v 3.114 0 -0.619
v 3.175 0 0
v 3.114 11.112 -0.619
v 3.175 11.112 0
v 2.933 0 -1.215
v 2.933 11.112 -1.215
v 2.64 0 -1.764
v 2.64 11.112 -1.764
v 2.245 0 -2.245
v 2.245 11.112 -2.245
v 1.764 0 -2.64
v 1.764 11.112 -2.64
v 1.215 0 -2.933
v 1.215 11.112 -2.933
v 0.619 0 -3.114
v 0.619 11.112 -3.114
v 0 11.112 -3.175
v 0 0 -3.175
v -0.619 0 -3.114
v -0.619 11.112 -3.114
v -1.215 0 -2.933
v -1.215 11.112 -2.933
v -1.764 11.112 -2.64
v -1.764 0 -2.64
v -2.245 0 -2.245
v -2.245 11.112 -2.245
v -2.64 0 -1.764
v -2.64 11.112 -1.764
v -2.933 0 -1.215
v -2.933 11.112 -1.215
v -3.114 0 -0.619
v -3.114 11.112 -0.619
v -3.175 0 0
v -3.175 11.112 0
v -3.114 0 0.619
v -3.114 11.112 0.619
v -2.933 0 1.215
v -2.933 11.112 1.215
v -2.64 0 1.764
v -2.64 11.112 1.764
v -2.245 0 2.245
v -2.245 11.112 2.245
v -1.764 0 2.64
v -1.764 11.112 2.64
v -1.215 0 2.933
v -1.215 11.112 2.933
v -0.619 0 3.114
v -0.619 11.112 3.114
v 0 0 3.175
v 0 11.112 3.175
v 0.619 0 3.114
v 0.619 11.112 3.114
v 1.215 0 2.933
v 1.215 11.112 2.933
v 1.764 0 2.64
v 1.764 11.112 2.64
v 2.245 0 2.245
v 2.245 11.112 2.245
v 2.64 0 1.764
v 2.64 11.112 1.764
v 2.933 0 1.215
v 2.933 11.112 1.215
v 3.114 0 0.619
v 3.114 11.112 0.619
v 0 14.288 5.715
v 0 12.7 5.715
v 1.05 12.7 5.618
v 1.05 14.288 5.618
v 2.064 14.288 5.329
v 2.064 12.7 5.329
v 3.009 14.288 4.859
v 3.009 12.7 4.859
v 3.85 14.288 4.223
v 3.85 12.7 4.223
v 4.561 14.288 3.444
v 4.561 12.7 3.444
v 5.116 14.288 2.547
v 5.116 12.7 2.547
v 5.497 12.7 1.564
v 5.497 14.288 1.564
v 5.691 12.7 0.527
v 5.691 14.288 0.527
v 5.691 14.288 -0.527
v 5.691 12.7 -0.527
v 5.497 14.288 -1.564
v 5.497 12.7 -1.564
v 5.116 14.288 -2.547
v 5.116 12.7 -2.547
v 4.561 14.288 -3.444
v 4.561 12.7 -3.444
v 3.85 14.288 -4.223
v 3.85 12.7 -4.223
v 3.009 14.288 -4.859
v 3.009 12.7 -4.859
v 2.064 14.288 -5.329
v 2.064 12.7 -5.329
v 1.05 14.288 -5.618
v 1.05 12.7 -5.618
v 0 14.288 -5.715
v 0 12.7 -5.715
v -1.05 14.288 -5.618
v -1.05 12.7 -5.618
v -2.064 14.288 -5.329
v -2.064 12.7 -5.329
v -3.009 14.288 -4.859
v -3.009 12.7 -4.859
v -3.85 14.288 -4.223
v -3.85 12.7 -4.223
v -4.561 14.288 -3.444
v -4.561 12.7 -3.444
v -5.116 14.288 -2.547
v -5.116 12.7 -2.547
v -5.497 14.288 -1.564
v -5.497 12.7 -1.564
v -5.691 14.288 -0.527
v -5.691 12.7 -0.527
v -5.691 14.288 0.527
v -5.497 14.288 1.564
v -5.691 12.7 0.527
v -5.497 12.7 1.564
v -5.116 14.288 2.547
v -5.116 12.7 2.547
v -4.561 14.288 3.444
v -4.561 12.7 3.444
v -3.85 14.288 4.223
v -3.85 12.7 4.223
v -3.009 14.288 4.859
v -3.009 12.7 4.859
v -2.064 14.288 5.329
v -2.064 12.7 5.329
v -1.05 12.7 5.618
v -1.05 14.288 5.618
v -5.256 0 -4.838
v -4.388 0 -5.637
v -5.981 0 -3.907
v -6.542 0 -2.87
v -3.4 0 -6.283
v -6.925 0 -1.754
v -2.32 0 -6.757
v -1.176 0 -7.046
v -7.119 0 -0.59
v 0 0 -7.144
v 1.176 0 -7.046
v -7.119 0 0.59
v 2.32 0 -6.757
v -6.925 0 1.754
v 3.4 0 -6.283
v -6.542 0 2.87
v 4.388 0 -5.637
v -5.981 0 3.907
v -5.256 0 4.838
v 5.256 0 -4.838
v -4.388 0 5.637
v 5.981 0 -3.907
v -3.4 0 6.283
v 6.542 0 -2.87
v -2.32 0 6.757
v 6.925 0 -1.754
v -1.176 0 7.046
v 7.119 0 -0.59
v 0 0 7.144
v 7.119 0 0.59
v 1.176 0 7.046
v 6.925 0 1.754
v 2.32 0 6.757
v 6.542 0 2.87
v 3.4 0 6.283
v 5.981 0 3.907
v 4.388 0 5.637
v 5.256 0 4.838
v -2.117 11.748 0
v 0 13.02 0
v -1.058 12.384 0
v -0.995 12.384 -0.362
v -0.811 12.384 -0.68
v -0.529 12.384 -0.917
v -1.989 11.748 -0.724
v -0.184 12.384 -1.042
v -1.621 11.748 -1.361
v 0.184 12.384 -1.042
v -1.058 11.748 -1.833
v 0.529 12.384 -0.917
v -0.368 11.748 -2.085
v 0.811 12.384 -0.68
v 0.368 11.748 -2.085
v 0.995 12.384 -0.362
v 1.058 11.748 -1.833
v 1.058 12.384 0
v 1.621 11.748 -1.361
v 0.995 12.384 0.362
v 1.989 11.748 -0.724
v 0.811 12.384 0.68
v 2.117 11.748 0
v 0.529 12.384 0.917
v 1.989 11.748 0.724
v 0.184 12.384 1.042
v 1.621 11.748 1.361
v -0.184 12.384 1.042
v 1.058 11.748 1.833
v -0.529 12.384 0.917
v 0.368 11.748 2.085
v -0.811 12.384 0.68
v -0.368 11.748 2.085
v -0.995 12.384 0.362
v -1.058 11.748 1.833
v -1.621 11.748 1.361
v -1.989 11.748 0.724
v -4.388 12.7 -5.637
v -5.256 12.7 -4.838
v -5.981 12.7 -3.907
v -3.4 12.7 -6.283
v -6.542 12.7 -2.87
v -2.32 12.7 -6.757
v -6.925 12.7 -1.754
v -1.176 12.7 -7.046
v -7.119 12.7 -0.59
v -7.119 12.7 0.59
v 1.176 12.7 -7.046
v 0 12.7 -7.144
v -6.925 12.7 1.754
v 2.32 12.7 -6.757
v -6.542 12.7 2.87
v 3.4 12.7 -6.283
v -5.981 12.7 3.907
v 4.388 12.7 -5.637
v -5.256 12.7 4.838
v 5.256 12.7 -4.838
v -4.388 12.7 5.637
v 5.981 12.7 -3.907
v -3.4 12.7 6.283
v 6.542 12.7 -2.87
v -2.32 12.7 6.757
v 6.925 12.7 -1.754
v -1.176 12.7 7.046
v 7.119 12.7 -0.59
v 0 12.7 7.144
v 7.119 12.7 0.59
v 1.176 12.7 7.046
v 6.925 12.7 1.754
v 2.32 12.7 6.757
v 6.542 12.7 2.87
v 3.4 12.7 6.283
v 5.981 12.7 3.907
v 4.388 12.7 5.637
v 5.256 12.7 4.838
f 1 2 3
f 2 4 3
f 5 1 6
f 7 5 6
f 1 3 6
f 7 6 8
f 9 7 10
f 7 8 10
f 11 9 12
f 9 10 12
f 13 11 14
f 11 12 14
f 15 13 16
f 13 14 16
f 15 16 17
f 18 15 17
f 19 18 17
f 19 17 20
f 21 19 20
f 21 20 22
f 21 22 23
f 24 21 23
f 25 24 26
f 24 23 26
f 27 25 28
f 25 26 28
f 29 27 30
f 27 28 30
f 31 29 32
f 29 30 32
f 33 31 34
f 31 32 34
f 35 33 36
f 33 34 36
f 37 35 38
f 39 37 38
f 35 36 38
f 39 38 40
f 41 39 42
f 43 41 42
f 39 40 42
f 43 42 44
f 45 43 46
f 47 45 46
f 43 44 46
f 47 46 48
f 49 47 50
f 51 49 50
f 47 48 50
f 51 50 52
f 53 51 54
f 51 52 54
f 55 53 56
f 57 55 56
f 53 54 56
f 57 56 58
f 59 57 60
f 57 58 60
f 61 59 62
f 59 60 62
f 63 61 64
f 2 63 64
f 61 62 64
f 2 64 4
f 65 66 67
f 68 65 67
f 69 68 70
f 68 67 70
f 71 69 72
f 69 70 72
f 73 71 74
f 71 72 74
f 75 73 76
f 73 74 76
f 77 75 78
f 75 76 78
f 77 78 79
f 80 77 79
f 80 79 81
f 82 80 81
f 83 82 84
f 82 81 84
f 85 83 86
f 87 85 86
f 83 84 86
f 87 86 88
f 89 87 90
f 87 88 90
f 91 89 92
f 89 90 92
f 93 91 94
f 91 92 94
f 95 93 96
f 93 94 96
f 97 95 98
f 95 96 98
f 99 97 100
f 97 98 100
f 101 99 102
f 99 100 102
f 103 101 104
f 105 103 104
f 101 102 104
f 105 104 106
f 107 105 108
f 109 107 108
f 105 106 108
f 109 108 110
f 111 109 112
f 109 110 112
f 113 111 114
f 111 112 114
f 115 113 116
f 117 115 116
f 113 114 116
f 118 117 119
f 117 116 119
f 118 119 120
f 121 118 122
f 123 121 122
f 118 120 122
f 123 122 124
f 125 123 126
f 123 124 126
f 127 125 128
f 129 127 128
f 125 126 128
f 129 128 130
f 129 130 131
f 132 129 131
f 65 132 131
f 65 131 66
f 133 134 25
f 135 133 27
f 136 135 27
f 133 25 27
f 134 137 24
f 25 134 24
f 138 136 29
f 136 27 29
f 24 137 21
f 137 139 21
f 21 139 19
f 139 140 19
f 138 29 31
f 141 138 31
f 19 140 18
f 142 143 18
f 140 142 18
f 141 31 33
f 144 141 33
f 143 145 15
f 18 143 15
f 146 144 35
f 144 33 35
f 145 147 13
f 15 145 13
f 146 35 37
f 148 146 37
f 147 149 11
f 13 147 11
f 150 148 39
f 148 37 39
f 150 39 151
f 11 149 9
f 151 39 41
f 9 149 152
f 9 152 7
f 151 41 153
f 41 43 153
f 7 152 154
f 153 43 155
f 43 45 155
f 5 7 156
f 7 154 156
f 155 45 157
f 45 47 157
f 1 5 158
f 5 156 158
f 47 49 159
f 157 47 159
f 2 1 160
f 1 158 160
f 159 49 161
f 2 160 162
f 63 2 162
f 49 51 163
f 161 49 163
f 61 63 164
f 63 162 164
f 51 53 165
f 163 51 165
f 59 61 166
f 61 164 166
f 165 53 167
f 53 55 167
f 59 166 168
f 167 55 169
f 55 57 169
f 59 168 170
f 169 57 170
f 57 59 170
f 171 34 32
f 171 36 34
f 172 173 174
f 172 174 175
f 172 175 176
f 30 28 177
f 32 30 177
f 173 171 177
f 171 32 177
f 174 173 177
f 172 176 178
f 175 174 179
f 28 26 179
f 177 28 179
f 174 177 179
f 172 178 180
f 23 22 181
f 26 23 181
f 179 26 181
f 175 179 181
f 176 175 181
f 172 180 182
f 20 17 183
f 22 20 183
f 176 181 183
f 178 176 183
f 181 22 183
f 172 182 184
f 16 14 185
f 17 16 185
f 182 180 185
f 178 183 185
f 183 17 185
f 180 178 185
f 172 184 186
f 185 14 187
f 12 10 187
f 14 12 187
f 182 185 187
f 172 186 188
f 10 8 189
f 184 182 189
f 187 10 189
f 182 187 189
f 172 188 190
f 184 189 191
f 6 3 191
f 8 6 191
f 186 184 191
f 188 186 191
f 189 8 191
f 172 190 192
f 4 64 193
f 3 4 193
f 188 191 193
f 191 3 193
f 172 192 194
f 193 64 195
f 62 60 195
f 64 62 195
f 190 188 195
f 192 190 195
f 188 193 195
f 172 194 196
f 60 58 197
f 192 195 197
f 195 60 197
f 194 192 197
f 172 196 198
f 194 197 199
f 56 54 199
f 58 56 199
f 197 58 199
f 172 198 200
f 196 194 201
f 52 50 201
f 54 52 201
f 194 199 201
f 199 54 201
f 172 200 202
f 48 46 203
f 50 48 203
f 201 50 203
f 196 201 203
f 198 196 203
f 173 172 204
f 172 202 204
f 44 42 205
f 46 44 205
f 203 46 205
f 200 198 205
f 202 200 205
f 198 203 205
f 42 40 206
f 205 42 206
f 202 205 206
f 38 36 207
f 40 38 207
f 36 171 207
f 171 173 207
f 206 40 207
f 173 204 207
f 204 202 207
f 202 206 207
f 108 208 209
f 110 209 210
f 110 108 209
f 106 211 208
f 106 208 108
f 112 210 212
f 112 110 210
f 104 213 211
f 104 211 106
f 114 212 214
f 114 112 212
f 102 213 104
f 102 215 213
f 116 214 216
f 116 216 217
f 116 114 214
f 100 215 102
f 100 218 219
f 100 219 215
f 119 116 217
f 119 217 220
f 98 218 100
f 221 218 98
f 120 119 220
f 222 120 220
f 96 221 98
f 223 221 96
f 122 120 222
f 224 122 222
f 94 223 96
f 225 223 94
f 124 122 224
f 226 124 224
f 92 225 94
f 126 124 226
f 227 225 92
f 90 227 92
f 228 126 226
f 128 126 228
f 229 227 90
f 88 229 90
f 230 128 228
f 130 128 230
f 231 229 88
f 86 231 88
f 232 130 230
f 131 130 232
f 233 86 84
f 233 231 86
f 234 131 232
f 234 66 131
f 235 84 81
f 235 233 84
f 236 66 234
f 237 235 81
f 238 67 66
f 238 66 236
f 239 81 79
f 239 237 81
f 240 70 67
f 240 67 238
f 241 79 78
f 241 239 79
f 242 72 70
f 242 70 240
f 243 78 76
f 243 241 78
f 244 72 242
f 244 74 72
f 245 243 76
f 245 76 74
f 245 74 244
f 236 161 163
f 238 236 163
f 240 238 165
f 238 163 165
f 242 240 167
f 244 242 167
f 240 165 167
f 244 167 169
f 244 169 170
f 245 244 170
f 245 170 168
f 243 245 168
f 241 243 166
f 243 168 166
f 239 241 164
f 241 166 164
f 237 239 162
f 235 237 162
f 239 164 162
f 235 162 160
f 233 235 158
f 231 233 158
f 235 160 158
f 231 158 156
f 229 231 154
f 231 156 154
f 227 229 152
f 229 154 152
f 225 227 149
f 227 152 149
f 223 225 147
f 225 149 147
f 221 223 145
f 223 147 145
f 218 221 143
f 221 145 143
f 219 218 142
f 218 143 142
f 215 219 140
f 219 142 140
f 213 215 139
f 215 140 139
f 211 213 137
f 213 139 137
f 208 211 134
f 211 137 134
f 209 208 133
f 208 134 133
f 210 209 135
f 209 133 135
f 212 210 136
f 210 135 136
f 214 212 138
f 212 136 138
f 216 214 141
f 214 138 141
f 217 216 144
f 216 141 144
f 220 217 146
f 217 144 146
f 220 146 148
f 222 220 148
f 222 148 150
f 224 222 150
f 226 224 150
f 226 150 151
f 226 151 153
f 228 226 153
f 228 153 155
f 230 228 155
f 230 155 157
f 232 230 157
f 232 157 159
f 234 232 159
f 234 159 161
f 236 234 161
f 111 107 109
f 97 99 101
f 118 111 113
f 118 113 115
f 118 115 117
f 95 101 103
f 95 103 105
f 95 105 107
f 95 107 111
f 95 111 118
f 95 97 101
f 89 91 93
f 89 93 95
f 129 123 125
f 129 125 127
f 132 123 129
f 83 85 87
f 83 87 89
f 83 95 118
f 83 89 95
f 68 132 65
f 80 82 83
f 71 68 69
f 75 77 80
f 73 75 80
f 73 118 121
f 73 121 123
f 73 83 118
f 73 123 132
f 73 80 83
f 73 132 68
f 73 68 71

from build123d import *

# Parameters (mm, degrees)
SKETCH1_R                       = 7.14375
BOSS_EXTRUDE1_DEPTH             = 12.7
SKETCH3_R                       = 5.715
BOSS_EXTRUDE2_DEPTH             = 1.5875
F_1_4_0_25_DIAMETER_HOLE1_D     = 6.35
F_1_4_0_25_DIAMETER_HOLE1_DEPTH = 11.1125
F_1_4_0_25_DIAMETER_HOLE1_TIP   = 1.907732465


with BuildPart() as part:
    # Sketch1 → Boss-Extrude1 (new body)
    with BuildSketch(Plane(origin=(0, 0, 0), x_dir=(1, 0, 0), z_dir=(0, 1, 0))):
        with Locations(Location((0, 0, 0), (0, 0, 270))):
            Circle(SKETCH1_R)
    extrude(amount=BOSS_EXTRUDE1_DEPTH)

    # Sketch3 → Boss-Extrude2 (add)
    with BuildSketch(Plane(origin=(0, 12.7, 0), x_dir=(1, 0, 0), z_dir=(0, 1, 0))):
        with Locations(Location((0, 0, 0), (0, 0, 270))):
            Circle(SKETCH3_R)
    extrude(amount=BOSS_EXTRUDE2_DEPTH)

    # 1/4 (0.25) Diameter Hole1
    with Locations(Plane(origin=(0, 0, 0), x_dir=(-1, 0, 0), z_dir=(0, -1, 0))):
        with Locations((0, 0)):
            Hole(F_1_4_0_25_DIAMETER_HOLE1_D / 2, depth=F_1_4_0_25_DIAMETER_HOLE1_DEPTH)
            with Locations((0, 0, -(F_1_4_0_25_DIAMETER_HOLE1_DEPTH + F_1_4_0_25_DIAMETER_HOLE1_TIP / 2))):  # 118° drill point
                Cone(0, F_1_4_0_25_DIAMETER_HOLE1_D / 2, F_1_4_0_25_DIAMETER_HOLE1_TIP, mode=Mode.SUBTRACT)


solid = part.part
